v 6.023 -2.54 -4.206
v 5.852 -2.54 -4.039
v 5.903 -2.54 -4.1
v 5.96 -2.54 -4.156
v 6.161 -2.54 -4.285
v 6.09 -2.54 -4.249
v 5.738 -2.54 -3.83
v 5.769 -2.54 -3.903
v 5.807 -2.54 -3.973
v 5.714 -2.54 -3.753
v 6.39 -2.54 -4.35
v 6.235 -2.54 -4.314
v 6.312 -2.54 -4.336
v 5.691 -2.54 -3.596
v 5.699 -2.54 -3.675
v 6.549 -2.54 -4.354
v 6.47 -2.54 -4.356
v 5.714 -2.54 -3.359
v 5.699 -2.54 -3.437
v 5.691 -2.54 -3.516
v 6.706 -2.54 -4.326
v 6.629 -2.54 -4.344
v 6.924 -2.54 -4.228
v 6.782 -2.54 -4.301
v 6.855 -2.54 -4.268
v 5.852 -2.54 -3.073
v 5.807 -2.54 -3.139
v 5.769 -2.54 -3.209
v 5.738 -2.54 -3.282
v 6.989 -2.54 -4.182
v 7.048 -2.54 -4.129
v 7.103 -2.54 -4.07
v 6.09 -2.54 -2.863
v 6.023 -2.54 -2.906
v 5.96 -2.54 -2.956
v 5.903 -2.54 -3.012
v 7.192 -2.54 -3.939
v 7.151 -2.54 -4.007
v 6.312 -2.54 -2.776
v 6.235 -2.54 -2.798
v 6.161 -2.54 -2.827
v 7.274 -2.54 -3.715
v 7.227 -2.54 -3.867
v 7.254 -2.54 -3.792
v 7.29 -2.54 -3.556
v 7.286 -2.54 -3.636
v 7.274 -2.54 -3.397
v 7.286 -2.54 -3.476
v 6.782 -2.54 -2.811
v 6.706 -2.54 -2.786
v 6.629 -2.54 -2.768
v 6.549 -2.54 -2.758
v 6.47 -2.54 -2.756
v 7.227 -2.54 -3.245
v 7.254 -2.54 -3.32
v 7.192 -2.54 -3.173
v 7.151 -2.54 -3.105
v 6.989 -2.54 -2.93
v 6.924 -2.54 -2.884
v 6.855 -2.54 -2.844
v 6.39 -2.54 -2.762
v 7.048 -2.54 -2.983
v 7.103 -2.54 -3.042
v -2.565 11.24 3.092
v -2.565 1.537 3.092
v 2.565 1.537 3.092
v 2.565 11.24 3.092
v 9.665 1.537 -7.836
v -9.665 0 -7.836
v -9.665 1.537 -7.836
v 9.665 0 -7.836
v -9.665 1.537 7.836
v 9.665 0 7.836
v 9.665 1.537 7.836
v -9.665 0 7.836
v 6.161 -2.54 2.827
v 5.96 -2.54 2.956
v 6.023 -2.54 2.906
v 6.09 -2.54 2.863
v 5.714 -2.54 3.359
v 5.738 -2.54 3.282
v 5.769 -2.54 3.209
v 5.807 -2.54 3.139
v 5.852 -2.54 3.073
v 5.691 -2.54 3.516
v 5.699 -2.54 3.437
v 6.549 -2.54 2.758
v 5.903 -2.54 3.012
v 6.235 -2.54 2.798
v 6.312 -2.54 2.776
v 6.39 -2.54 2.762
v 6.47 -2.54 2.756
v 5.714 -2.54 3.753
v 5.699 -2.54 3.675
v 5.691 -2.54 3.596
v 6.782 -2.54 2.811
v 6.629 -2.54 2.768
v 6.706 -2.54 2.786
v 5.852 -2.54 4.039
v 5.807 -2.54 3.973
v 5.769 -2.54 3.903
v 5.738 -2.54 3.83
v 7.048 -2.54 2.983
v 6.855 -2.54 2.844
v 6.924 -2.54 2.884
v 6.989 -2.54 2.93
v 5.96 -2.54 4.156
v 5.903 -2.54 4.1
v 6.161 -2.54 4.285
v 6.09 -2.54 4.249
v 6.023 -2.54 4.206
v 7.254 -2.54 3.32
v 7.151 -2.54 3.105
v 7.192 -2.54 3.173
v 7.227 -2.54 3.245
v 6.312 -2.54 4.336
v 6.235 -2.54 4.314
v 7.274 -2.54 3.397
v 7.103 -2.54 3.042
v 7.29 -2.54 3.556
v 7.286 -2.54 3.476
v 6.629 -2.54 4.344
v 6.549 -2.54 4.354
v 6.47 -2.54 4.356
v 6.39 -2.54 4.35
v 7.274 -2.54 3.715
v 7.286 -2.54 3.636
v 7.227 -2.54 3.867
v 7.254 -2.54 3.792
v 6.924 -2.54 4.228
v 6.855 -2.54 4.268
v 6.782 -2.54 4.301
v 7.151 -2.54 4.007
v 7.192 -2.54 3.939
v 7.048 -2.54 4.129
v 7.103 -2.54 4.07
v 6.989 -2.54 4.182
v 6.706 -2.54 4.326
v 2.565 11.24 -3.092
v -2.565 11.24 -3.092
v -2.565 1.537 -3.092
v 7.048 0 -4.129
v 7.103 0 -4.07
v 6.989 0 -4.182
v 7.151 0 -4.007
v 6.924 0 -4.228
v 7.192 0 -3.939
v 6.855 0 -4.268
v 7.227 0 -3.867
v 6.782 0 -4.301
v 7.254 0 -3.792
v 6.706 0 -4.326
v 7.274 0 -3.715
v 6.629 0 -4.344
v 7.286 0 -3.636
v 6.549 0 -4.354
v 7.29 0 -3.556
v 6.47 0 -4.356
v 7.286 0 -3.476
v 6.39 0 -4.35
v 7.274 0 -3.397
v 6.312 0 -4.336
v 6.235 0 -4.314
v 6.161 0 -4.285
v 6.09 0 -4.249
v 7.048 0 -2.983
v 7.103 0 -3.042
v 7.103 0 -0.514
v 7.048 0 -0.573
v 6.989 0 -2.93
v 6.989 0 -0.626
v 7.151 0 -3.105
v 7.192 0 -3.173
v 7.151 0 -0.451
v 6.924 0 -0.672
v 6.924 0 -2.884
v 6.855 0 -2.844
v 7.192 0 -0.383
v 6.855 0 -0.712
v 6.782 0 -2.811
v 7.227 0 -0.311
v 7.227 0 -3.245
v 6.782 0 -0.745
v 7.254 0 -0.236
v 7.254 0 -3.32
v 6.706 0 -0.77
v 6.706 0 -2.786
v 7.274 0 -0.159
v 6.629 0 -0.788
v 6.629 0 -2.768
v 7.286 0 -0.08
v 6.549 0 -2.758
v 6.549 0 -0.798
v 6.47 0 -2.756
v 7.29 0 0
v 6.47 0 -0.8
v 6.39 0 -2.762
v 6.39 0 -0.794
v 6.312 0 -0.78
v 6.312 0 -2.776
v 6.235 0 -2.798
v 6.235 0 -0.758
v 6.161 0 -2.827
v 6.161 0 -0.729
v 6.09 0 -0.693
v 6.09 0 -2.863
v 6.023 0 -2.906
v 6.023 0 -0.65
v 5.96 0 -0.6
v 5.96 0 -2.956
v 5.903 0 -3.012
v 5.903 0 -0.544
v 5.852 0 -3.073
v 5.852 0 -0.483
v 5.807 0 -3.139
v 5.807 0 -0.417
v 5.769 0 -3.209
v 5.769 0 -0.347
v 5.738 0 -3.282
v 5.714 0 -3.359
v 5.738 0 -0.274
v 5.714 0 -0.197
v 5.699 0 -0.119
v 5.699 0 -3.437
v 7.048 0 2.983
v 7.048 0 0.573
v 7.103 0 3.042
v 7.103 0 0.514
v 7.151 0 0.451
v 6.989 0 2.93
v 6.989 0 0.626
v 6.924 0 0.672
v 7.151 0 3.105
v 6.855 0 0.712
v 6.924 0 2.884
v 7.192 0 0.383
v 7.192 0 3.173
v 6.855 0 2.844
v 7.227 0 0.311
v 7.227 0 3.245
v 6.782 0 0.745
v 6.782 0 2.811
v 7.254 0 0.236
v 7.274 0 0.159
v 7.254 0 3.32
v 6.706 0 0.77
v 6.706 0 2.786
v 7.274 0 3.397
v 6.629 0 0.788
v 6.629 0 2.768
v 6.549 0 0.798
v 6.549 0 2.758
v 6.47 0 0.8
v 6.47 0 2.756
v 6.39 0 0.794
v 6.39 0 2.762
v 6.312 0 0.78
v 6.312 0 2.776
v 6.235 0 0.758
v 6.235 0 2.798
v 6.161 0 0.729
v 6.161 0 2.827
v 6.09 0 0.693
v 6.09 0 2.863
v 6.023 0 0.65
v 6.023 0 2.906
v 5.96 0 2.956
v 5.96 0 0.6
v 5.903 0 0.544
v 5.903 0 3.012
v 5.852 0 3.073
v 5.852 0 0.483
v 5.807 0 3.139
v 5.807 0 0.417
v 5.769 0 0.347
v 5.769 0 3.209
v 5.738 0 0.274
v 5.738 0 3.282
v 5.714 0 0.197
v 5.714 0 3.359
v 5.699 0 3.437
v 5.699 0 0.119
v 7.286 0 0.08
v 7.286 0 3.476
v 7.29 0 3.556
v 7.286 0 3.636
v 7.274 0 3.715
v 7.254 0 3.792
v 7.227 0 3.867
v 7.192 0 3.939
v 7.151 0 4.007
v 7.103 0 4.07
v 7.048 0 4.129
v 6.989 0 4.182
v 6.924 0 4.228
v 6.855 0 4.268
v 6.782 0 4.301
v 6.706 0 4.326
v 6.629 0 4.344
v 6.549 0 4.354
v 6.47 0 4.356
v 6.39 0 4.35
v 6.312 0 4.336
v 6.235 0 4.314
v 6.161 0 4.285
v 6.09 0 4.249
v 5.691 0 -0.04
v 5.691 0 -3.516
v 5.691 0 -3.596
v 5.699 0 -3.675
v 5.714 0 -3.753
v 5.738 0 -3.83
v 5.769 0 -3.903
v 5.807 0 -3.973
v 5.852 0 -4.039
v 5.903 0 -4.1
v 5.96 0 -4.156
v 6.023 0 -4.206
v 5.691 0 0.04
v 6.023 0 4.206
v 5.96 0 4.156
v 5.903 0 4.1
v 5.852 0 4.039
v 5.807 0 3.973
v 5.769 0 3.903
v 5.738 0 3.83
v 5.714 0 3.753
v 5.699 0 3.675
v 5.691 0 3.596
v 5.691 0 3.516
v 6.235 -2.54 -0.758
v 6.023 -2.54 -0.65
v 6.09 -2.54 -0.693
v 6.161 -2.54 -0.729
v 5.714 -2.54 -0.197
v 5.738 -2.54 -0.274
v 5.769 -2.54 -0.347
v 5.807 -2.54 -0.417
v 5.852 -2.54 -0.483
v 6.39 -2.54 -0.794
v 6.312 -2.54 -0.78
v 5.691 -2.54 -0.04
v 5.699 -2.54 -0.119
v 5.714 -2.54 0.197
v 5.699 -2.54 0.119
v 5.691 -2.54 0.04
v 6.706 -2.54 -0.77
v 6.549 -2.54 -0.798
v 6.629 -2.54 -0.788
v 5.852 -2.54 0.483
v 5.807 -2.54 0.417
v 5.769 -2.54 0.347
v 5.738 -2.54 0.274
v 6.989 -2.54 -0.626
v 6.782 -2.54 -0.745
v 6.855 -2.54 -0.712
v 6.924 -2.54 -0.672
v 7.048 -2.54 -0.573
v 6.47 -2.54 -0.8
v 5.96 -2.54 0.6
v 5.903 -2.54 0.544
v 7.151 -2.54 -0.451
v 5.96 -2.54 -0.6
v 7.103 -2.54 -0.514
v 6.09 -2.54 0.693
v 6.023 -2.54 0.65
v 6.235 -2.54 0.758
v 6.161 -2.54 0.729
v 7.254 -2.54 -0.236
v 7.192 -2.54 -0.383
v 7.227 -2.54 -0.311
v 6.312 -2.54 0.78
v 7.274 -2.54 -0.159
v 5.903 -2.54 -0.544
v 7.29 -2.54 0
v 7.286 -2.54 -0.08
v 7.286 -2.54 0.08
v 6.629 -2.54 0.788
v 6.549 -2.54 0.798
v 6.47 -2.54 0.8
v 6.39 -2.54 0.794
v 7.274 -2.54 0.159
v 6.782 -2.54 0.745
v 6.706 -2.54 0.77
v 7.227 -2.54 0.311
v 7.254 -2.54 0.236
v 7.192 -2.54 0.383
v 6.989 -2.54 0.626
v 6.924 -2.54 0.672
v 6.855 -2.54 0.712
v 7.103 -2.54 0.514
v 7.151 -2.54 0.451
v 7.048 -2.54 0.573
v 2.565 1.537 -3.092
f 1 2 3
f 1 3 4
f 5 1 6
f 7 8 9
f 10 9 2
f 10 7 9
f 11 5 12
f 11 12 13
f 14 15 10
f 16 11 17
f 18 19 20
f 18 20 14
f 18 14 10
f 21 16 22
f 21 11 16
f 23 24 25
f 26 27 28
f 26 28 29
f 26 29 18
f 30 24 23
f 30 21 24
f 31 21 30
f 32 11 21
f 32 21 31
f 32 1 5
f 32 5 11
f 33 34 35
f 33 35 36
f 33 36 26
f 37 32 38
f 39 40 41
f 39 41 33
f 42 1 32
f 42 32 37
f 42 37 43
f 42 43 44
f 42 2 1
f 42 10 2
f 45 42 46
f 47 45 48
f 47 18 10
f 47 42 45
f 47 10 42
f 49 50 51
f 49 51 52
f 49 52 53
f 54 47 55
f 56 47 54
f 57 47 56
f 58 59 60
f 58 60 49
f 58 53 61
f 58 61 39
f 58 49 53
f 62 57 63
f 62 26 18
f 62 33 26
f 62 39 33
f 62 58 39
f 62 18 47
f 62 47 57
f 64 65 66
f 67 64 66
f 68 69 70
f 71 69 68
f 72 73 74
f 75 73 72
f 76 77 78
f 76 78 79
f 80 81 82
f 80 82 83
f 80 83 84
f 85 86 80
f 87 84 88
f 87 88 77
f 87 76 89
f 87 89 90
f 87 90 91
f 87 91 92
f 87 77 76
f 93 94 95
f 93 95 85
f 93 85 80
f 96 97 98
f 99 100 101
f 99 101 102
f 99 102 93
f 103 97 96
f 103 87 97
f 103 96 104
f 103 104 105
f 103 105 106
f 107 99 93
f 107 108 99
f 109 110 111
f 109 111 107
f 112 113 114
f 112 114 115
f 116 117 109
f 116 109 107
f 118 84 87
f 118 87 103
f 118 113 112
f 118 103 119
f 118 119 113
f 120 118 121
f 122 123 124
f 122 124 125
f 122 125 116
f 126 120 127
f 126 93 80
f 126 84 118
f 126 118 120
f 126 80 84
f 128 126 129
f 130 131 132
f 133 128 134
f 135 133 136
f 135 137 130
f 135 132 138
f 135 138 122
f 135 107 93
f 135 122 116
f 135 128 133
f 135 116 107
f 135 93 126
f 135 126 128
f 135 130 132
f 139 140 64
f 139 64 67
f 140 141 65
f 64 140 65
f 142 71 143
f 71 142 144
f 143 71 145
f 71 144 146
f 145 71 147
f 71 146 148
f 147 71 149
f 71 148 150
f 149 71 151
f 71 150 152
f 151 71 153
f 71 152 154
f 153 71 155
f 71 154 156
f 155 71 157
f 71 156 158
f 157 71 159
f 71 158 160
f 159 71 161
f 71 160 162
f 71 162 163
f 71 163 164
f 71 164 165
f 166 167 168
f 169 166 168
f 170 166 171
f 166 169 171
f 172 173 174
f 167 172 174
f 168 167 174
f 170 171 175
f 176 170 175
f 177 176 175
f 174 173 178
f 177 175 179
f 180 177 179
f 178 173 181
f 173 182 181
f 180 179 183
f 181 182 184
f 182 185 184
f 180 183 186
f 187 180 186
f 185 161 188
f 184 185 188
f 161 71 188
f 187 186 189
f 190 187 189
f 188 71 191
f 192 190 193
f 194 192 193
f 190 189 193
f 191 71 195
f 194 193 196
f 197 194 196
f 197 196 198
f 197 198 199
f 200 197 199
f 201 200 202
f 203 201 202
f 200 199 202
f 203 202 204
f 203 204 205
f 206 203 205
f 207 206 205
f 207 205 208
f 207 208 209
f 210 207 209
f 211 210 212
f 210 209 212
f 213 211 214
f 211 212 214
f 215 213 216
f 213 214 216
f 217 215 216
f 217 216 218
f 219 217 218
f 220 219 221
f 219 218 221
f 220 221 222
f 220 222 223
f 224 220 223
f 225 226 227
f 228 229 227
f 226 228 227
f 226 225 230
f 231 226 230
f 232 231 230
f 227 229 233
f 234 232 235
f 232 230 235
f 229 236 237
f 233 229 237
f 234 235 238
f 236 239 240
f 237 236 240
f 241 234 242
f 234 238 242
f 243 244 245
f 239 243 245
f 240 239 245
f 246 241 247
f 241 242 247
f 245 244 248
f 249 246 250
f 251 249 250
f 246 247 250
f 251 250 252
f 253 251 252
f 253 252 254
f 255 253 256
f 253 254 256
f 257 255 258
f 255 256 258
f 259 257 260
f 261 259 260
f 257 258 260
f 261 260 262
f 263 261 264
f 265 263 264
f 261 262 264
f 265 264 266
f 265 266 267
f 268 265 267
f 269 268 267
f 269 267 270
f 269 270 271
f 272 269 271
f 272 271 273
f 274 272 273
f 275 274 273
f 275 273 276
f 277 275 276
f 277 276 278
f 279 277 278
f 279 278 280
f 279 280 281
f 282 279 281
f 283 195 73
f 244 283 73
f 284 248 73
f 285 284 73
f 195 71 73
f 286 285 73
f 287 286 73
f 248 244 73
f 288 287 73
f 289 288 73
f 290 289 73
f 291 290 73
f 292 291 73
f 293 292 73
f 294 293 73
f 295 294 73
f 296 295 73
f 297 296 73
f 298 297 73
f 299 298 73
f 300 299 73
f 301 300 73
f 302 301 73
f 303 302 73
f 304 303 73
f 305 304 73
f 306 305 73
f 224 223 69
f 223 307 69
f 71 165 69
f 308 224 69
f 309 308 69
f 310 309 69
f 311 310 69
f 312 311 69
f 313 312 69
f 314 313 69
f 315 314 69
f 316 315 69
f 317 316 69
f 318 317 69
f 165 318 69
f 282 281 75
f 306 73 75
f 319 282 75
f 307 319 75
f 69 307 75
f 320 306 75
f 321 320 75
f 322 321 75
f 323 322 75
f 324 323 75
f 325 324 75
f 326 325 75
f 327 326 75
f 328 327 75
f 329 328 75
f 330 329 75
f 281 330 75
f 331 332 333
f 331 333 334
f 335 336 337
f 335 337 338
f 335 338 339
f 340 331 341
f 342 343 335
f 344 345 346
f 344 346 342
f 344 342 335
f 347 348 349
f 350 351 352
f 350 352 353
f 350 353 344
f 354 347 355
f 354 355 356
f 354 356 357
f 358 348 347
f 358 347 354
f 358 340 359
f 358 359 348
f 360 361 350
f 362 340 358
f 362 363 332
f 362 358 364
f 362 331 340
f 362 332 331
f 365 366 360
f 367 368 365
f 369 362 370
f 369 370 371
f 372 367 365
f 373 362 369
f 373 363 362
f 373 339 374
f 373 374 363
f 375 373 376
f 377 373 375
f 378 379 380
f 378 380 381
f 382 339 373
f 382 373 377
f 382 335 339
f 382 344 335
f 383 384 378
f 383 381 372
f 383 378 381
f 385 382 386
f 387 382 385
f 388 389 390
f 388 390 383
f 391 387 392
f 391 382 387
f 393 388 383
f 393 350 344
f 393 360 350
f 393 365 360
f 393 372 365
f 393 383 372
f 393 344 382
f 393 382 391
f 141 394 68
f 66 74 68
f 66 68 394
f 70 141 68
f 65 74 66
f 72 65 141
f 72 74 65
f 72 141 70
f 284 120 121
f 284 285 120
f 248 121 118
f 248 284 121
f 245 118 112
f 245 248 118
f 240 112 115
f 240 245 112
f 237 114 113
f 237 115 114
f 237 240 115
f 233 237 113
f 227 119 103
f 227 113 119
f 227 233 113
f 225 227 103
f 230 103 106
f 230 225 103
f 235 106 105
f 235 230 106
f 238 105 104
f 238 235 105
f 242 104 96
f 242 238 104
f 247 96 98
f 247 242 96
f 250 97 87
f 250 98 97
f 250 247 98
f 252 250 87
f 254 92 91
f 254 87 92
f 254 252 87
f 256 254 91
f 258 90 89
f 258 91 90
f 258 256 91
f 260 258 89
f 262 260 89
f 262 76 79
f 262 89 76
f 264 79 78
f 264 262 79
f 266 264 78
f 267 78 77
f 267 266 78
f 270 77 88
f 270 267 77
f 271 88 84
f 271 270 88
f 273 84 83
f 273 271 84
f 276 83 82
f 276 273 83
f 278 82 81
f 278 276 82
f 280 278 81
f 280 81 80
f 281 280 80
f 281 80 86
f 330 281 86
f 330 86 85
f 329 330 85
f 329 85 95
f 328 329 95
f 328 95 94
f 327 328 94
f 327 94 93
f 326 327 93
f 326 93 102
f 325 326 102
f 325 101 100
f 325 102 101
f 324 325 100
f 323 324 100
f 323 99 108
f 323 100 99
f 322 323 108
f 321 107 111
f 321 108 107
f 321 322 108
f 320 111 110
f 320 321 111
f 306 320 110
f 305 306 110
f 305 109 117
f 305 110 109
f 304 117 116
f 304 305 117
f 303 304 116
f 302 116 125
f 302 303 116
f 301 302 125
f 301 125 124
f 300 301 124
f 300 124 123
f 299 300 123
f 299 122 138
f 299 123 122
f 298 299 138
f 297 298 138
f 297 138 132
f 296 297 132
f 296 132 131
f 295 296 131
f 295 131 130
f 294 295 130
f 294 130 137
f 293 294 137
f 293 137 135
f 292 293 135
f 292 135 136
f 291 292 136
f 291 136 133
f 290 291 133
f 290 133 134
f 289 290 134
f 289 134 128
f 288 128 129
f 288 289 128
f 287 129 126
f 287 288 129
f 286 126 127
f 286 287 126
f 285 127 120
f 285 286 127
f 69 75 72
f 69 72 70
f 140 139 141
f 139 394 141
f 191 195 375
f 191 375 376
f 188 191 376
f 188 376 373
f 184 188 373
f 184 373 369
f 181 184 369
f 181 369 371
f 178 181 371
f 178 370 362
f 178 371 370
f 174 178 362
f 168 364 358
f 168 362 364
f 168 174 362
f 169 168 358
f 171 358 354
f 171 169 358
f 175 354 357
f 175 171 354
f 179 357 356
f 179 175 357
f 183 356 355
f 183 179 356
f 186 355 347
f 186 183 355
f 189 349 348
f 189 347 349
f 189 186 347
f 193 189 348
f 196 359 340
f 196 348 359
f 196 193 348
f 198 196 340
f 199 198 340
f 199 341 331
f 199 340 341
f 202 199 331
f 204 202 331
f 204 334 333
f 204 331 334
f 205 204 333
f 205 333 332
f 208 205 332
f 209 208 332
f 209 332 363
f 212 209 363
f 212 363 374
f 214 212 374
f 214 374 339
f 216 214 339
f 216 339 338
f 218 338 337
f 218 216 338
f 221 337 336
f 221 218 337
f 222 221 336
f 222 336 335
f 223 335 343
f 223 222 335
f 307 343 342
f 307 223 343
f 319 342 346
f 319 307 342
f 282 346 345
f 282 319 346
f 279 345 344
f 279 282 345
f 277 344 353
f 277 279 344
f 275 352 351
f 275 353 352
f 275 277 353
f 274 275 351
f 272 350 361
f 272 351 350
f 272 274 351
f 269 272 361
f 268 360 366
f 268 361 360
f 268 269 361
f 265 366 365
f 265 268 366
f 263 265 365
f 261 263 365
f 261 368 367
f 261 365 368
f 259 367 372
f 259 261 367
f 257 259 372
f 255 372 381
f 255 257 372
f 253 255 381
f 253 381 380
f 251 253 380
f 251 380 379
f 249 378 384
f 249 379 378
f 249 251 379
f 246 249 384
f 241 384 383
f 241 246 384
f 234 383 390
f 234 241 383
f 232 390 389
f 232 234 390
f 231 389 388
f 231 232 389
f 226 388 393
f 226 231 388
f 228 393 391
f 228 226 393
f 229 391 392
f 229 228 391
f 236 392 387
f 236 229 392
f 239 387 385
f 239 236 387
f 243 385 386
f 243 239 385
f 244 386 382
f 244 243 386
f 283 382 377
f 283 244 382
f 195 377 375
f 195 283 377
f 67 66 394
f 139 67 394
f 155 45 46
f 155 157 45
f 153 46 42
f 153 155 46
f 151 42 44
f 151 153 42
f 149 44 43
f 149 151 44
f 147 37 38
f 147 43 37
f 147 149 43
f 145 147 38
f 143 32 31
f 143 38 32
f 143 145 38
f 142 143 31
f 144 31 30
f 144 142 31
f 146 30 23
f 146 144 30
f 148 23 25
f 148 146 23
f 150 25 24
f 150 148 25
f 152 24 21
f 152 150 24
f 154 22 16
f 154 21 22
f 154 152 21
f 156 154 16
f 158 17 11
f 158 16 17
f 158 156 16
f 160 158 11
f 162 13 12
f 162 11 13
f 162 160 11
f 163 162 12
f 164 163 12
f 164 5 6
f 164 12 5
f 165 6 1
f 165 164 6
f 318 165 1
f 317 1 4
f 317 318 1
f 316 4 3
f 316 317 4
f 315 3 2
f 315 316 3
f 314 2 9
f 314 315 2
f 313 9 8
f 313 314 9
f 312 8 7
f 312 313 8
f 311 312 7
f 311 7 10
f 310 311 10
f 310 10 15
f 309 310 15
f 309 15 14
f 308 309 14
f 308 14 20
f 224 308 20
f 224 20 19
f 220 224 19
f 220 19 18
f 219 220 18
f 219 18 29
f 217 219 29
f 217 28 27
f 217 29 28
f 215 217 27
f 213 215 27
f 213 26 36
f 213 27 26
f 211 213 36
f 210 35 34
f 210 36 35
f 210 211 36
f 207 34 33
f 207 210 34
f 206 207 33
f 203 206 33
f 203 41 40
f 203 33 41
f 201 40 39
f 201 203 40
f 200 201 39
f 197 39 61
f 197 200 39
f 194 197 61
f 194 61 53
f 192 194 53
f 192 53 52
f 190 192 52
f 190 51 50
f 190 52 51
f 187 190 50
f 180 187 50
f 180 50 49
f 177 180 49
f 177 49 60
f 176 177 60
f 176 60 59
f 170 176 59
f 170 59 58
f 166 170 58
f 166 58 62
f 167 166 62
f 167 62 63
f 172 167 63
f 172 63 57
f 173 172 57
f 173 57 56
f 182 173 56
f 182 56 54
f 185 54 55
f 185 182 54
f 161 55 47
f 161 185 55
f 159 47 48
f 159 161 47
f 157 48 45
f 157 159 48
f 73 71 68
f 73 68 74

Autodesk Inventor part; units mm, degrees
ref_plane "YZ Plane" through (0, 0, 0) normal (1, 0, 0) x (0, 1, 0)
ref_plane "XZ Plane" through (0, 0, 0) normal (0, 1, 0) x (-1, 0, 0)
ref_plane "XY Plane" through (0, 0, 0) normal (0, 0, 1) x (1, 0, 0)
sketch "Sketch1" plane through (0, 0, 0) normal (0, 1, 0) x (-1, 0, 0)
  line L0 (9.6647, -7.8359) -> (-9.6647, -7.8359)
  line L1 (-9.6647, -7.8359) -> (-9.6647, 7.8359)
  line L2 (-9.6647, 7.8359) -> (9.6647, 7.8359)
  line L3 (9.6647, 7.8359) -> (9.6647, -7.8359)
  point P0 (0, 0)
  point P1 (-9.6647, 0)
  point P2 (0, -7.8359)
  dimension "d0" = 19.3294
  dimension "d1" = 15.6718
extrude "Extrusion1" add sketch "Sketch1" along normal blind 1.5367
sketch "Sketch2" plane through (0, 1.5367, 0) normal (0, 1, 0) x (1, 0, 0)
  line L0 (-2.5654, -3.0925) -> (2.5654, -3.0925)
  line L1 (2.5654, -3.0925) -> (2.5654, 3.0925)
  line L2 (2.5654, 3.0925) -> (-2.5654, 3.0925)
  line L3 (-2.5654, 3.0925) -> (-2.5654, -3.0925)
  point P0 (0, 0)
  point P1 (-2.5654, 0)
  point P2 (0, 3.0925)
  dimension "d4" = 5.1308
  dimension "d5" = 6.1849
extrude "Extrusion2" add sketch "Sketch2" along normal blind 9.7028
sketch "Sketch3" plane through (0, 0, 0) normal (0, -1, 0) x (1, 0, 0)
  circle A0 centre (51.2064, 25.6032) radius 0.8001
  circle A1 centre (6.4897, 3.556) radius 0.8001
  circle A2 centre (6.4897, 0) radius 0.8001
  circle A3 centre (6.4897, -3.556) radius 0.8001
  line L0 (9.6647, 7.8359) -> (9.6647, -7.8359) projected
  point P0 (0, 0)
  dimension "d8" = 1.6002
  dimension "d9" = 1.6002
  dimension "d10" = 1.6002
  dimension "d11" = 7.112
  dimension "d12" = 3.556
  dimension "d13" = 3.175
  dimension "d14" = 3.175
extrude "Extrusion3" add sketch "Sketch3" along normal blind 2.54 contours A1 | A2 | A3
properties part number "IF Remote reader"
